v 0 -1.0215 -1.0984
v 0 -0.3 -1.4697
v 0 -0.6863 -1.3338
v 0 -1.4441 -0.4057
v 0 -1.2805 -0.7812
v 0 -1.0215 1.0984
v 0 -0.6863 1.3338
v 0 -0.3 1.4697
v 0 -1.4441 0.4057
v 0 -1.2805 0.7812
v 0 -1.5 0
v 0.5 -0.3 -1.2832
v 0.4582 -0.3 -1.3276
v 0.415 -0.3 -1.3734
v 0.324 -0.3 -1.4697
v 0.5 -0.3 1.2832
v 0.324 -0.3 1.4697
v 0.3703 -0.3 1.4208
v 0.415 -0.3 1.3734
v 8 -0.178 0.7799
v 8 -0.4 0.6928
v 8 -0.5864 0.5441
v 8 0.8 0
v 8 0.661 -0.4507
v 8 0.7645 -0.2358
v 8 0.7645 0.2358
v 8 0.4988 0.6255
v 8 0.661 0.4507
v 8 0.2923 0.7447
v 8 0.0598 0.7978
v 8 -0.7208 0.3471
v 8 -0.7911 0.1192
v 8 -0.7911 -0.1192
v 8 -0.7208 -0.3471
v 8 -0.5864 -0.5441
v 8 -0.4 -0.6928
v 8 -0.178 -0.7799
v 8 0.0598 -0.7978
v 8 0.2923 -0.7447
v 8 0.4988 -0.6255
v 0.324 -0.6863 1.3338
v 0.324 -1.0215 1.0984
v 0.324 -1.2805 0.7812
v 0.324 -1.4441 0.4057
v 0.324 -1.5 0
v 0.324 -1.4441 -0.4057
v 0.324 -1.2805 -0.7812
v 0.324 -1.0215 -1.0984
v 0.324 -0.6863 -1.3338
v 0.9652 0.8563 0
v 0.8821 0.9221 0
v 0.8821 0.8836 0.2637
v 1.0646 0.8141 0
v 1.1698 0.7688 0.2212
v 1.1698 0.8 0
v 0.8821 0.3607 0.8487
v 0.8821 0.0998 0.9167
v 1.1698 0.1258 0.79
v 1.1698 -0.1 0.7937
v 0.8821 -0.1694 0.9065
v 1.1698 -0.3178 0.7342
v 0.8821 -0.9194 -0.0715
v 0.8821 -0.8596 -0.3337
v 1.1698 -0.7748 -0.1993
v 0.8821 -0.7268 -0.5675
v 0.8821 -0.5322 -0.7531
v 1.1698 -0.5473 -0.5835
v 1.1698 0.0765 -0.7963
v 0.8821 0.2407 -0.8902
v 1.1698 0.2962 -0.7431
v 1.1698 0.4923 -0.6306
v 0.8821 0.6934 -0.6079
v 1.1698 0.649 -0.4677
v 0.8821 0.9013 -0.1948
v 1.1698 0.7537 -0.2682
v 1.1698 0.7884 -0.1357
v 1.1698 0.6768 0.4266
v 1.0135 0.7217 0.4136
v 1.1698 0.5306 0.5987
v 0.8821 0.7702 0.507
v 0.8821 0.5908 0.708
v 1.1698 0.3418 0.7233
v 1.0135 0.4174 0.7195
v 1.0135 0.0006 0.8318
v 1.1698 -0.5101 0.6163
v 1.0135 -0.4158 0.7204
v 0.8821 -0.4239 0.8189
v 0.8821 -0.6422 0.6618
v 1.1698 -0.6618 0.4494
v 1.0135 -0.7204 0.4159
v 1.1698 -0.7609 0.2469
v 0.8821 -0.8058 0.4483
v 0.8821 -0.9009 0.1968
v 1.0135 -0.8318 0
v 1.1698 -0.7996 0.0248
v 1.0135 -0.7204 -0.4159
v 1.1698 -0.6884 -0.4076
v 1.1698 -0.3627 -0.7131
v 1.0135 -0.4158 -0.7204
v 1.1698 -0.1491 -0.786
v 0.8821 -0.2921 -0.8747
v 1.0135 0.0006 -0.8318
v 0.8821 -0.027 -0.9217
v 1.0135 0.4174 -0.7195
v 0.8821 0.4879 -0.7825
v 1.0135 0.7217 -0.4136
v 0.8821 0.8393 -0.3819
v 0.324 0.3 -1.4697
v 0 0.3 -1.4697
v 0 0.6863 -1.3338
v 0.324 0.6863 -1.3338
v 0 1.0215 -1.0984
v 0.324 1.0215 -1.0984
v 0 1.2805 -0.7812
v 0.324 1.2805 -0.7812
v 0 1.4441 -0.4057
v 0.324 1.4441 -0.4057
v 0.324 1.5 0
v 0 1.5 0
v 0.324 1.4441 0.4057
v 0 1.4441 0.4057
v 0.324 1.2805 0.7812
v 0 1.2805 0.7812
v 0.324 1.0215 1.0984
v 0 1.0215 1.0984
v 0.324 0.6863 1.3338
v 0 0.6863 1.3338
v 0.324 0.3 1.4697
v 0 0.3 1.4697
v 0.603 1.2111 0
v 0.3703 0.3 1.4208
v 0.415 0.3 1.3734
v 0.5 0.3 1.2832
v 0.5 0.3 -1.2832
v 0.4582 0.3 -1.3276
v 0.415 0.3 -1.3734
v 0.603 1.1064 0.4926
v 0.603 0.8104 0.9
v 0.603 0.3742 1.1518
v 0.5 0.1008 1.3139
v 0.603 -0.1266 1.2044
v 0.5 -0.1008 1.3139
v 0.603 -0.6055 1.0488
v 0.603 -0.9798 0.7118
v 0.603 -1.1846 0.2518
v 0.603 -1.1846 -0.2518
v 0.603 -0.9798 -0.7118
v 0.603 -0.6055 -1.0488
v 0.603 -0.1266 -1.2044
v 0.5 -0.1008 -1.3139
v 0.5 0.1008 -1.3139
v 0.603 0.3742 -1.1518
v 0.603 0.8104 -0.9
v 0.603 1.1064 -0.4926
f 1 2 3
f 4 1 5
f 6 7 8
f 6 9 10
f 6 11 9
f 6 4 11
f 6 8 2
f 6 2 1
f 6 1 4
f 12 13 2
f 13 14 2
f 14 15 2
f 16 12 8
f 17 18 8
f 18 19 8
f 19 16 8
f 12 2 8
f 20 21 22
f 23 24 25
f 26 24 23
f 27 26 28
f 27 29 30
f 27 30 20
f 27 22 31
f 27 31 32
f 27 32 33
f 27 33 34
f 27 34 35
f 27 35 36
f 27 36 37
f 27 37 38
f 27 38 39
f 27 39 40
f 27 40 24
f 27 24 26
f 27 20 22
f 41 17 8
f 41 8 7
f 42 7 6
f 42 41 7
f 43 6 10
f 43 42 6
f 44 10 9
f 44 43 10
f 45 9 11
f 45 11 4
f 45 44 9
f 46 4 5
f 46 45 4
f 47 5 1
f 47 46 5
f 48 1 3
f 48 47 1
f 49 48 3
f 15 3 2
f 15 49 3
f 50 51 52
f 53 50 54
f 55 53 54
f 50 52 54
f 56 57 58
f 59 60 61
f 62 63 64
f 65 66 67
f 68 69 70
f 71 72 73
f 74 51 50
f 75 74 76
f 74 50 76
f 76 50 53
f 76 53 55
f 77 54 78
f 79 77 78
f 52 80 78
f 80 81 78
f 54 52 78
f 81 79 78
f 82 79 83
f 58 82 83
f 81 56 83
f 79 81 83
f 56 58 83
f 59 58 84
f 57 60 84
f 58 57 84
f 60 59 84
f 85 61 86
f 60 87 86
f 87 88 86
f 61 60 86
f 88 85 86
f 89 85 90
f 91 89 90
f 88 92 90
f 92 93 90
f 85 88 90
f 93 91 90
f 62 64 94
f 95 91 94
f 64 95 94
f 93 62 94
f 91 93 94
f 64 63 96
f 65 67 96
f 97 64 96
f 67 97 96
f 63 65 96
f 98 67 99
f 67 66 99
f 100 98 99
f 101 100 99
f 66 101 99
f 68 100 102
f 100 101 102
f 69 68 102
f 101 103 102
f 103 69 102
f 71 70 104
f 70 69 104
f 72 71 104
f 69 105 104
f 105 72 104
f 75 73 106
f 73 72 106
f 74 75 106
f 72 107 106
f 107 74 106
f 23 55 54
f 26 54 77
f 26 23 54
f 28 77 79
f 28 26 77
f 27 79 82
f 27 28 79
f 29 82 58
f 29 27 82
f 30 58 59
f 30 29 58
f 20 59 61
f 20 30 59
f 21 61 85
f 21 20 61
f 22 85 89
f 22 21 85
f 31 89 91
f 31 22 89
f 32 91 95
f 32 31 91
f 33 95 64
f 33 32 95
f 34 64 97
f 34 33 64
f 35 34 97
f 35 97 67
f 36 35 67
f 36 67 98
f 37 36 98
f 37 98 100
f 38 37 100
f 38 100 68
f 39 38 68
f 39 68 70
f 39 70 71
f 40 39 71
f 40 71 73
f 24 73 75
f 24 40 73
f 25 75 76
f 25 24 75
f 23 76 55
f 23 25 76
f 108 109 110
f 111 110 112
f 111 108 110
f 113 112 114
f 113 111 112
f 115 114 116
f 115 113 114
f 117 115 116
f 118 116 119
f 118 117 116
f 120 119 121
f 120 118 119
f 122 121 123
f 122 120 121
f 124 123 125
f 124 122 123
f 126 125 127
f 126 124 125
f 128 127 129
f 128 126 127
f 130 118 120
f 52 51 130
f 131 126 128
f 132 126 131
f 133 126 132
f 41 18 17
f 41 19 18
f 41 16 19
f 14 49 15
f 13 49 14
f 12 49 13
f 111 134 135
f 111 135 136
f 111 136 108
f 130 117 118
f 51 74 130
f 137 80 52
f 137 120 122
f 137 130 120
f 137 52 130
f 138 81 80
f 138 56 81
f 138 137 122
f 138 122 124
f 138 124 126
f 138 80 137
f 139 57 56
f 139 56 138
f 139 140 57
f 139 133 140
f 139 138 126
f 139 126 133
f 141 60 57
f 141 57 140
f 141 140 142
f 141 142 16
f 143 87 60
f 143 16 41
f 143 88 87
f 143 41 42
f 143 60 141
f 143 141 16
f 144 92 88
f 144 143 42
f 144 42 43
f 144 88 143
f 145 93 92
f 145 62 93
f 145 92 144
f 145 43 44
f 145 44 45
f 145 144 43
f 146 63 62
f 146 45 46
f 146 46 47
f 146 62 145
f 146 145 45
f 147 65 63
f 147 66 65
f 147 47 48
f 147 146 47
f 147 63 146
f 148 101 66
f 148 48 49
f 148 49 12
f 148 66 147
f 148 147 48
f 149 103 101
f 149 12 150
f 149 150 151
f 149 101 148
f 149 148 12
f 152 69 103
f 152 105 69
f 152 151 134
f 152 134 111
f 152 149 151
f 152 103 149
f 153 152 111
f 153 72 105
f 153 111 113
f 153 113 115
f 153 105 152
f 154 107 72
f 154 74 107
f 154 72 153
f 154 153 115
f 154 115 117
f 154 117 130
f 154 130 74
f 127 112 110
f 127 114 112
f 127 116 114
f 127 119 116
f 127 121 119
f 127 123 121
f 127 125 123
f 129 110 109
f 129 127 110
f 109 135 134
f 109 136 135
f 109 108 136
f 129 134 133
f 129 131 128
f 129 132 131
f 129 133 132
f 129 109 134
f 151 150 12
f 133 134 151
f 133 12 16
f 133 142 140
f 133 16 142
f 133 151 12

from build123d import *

# Parameters (mm, degrees)
FILLET1_R  = 0.4
SLOTSKE_W  = 3
SLOTSKE_H  = 0.6
SLOT_DEPTH = 0.5


with BuildPart() as part:
    # BodySke → BaseBody (revolve)
    with BuildSketch(Plane.XY):
        Polygon((0, 0), (0, 1.5), (0.324017858, 1.5), (1, 0.8), (8, 0.8), (8, 0), align=None)
    revolve(axis=Axis((0, 0, 0), (1, 0, 0)))

    # Fillet1
    fillet1_edges = [part.edges().sort_by_distance(p)[0] for p in [
        (1, -0.8, 0),
    ]]
    fillet(fillet1_edges, radius=FILLET1_R)

    # SlotSke → Slot (cut)
    with BuildSketch(Plane.ZY):
        Rectangle(SLOTSKE_W, SLOTSKE_H)
    extrude(amount=-SLOT_DEPTH, mode=Mode.SUBTRACT)


solid = part.part
